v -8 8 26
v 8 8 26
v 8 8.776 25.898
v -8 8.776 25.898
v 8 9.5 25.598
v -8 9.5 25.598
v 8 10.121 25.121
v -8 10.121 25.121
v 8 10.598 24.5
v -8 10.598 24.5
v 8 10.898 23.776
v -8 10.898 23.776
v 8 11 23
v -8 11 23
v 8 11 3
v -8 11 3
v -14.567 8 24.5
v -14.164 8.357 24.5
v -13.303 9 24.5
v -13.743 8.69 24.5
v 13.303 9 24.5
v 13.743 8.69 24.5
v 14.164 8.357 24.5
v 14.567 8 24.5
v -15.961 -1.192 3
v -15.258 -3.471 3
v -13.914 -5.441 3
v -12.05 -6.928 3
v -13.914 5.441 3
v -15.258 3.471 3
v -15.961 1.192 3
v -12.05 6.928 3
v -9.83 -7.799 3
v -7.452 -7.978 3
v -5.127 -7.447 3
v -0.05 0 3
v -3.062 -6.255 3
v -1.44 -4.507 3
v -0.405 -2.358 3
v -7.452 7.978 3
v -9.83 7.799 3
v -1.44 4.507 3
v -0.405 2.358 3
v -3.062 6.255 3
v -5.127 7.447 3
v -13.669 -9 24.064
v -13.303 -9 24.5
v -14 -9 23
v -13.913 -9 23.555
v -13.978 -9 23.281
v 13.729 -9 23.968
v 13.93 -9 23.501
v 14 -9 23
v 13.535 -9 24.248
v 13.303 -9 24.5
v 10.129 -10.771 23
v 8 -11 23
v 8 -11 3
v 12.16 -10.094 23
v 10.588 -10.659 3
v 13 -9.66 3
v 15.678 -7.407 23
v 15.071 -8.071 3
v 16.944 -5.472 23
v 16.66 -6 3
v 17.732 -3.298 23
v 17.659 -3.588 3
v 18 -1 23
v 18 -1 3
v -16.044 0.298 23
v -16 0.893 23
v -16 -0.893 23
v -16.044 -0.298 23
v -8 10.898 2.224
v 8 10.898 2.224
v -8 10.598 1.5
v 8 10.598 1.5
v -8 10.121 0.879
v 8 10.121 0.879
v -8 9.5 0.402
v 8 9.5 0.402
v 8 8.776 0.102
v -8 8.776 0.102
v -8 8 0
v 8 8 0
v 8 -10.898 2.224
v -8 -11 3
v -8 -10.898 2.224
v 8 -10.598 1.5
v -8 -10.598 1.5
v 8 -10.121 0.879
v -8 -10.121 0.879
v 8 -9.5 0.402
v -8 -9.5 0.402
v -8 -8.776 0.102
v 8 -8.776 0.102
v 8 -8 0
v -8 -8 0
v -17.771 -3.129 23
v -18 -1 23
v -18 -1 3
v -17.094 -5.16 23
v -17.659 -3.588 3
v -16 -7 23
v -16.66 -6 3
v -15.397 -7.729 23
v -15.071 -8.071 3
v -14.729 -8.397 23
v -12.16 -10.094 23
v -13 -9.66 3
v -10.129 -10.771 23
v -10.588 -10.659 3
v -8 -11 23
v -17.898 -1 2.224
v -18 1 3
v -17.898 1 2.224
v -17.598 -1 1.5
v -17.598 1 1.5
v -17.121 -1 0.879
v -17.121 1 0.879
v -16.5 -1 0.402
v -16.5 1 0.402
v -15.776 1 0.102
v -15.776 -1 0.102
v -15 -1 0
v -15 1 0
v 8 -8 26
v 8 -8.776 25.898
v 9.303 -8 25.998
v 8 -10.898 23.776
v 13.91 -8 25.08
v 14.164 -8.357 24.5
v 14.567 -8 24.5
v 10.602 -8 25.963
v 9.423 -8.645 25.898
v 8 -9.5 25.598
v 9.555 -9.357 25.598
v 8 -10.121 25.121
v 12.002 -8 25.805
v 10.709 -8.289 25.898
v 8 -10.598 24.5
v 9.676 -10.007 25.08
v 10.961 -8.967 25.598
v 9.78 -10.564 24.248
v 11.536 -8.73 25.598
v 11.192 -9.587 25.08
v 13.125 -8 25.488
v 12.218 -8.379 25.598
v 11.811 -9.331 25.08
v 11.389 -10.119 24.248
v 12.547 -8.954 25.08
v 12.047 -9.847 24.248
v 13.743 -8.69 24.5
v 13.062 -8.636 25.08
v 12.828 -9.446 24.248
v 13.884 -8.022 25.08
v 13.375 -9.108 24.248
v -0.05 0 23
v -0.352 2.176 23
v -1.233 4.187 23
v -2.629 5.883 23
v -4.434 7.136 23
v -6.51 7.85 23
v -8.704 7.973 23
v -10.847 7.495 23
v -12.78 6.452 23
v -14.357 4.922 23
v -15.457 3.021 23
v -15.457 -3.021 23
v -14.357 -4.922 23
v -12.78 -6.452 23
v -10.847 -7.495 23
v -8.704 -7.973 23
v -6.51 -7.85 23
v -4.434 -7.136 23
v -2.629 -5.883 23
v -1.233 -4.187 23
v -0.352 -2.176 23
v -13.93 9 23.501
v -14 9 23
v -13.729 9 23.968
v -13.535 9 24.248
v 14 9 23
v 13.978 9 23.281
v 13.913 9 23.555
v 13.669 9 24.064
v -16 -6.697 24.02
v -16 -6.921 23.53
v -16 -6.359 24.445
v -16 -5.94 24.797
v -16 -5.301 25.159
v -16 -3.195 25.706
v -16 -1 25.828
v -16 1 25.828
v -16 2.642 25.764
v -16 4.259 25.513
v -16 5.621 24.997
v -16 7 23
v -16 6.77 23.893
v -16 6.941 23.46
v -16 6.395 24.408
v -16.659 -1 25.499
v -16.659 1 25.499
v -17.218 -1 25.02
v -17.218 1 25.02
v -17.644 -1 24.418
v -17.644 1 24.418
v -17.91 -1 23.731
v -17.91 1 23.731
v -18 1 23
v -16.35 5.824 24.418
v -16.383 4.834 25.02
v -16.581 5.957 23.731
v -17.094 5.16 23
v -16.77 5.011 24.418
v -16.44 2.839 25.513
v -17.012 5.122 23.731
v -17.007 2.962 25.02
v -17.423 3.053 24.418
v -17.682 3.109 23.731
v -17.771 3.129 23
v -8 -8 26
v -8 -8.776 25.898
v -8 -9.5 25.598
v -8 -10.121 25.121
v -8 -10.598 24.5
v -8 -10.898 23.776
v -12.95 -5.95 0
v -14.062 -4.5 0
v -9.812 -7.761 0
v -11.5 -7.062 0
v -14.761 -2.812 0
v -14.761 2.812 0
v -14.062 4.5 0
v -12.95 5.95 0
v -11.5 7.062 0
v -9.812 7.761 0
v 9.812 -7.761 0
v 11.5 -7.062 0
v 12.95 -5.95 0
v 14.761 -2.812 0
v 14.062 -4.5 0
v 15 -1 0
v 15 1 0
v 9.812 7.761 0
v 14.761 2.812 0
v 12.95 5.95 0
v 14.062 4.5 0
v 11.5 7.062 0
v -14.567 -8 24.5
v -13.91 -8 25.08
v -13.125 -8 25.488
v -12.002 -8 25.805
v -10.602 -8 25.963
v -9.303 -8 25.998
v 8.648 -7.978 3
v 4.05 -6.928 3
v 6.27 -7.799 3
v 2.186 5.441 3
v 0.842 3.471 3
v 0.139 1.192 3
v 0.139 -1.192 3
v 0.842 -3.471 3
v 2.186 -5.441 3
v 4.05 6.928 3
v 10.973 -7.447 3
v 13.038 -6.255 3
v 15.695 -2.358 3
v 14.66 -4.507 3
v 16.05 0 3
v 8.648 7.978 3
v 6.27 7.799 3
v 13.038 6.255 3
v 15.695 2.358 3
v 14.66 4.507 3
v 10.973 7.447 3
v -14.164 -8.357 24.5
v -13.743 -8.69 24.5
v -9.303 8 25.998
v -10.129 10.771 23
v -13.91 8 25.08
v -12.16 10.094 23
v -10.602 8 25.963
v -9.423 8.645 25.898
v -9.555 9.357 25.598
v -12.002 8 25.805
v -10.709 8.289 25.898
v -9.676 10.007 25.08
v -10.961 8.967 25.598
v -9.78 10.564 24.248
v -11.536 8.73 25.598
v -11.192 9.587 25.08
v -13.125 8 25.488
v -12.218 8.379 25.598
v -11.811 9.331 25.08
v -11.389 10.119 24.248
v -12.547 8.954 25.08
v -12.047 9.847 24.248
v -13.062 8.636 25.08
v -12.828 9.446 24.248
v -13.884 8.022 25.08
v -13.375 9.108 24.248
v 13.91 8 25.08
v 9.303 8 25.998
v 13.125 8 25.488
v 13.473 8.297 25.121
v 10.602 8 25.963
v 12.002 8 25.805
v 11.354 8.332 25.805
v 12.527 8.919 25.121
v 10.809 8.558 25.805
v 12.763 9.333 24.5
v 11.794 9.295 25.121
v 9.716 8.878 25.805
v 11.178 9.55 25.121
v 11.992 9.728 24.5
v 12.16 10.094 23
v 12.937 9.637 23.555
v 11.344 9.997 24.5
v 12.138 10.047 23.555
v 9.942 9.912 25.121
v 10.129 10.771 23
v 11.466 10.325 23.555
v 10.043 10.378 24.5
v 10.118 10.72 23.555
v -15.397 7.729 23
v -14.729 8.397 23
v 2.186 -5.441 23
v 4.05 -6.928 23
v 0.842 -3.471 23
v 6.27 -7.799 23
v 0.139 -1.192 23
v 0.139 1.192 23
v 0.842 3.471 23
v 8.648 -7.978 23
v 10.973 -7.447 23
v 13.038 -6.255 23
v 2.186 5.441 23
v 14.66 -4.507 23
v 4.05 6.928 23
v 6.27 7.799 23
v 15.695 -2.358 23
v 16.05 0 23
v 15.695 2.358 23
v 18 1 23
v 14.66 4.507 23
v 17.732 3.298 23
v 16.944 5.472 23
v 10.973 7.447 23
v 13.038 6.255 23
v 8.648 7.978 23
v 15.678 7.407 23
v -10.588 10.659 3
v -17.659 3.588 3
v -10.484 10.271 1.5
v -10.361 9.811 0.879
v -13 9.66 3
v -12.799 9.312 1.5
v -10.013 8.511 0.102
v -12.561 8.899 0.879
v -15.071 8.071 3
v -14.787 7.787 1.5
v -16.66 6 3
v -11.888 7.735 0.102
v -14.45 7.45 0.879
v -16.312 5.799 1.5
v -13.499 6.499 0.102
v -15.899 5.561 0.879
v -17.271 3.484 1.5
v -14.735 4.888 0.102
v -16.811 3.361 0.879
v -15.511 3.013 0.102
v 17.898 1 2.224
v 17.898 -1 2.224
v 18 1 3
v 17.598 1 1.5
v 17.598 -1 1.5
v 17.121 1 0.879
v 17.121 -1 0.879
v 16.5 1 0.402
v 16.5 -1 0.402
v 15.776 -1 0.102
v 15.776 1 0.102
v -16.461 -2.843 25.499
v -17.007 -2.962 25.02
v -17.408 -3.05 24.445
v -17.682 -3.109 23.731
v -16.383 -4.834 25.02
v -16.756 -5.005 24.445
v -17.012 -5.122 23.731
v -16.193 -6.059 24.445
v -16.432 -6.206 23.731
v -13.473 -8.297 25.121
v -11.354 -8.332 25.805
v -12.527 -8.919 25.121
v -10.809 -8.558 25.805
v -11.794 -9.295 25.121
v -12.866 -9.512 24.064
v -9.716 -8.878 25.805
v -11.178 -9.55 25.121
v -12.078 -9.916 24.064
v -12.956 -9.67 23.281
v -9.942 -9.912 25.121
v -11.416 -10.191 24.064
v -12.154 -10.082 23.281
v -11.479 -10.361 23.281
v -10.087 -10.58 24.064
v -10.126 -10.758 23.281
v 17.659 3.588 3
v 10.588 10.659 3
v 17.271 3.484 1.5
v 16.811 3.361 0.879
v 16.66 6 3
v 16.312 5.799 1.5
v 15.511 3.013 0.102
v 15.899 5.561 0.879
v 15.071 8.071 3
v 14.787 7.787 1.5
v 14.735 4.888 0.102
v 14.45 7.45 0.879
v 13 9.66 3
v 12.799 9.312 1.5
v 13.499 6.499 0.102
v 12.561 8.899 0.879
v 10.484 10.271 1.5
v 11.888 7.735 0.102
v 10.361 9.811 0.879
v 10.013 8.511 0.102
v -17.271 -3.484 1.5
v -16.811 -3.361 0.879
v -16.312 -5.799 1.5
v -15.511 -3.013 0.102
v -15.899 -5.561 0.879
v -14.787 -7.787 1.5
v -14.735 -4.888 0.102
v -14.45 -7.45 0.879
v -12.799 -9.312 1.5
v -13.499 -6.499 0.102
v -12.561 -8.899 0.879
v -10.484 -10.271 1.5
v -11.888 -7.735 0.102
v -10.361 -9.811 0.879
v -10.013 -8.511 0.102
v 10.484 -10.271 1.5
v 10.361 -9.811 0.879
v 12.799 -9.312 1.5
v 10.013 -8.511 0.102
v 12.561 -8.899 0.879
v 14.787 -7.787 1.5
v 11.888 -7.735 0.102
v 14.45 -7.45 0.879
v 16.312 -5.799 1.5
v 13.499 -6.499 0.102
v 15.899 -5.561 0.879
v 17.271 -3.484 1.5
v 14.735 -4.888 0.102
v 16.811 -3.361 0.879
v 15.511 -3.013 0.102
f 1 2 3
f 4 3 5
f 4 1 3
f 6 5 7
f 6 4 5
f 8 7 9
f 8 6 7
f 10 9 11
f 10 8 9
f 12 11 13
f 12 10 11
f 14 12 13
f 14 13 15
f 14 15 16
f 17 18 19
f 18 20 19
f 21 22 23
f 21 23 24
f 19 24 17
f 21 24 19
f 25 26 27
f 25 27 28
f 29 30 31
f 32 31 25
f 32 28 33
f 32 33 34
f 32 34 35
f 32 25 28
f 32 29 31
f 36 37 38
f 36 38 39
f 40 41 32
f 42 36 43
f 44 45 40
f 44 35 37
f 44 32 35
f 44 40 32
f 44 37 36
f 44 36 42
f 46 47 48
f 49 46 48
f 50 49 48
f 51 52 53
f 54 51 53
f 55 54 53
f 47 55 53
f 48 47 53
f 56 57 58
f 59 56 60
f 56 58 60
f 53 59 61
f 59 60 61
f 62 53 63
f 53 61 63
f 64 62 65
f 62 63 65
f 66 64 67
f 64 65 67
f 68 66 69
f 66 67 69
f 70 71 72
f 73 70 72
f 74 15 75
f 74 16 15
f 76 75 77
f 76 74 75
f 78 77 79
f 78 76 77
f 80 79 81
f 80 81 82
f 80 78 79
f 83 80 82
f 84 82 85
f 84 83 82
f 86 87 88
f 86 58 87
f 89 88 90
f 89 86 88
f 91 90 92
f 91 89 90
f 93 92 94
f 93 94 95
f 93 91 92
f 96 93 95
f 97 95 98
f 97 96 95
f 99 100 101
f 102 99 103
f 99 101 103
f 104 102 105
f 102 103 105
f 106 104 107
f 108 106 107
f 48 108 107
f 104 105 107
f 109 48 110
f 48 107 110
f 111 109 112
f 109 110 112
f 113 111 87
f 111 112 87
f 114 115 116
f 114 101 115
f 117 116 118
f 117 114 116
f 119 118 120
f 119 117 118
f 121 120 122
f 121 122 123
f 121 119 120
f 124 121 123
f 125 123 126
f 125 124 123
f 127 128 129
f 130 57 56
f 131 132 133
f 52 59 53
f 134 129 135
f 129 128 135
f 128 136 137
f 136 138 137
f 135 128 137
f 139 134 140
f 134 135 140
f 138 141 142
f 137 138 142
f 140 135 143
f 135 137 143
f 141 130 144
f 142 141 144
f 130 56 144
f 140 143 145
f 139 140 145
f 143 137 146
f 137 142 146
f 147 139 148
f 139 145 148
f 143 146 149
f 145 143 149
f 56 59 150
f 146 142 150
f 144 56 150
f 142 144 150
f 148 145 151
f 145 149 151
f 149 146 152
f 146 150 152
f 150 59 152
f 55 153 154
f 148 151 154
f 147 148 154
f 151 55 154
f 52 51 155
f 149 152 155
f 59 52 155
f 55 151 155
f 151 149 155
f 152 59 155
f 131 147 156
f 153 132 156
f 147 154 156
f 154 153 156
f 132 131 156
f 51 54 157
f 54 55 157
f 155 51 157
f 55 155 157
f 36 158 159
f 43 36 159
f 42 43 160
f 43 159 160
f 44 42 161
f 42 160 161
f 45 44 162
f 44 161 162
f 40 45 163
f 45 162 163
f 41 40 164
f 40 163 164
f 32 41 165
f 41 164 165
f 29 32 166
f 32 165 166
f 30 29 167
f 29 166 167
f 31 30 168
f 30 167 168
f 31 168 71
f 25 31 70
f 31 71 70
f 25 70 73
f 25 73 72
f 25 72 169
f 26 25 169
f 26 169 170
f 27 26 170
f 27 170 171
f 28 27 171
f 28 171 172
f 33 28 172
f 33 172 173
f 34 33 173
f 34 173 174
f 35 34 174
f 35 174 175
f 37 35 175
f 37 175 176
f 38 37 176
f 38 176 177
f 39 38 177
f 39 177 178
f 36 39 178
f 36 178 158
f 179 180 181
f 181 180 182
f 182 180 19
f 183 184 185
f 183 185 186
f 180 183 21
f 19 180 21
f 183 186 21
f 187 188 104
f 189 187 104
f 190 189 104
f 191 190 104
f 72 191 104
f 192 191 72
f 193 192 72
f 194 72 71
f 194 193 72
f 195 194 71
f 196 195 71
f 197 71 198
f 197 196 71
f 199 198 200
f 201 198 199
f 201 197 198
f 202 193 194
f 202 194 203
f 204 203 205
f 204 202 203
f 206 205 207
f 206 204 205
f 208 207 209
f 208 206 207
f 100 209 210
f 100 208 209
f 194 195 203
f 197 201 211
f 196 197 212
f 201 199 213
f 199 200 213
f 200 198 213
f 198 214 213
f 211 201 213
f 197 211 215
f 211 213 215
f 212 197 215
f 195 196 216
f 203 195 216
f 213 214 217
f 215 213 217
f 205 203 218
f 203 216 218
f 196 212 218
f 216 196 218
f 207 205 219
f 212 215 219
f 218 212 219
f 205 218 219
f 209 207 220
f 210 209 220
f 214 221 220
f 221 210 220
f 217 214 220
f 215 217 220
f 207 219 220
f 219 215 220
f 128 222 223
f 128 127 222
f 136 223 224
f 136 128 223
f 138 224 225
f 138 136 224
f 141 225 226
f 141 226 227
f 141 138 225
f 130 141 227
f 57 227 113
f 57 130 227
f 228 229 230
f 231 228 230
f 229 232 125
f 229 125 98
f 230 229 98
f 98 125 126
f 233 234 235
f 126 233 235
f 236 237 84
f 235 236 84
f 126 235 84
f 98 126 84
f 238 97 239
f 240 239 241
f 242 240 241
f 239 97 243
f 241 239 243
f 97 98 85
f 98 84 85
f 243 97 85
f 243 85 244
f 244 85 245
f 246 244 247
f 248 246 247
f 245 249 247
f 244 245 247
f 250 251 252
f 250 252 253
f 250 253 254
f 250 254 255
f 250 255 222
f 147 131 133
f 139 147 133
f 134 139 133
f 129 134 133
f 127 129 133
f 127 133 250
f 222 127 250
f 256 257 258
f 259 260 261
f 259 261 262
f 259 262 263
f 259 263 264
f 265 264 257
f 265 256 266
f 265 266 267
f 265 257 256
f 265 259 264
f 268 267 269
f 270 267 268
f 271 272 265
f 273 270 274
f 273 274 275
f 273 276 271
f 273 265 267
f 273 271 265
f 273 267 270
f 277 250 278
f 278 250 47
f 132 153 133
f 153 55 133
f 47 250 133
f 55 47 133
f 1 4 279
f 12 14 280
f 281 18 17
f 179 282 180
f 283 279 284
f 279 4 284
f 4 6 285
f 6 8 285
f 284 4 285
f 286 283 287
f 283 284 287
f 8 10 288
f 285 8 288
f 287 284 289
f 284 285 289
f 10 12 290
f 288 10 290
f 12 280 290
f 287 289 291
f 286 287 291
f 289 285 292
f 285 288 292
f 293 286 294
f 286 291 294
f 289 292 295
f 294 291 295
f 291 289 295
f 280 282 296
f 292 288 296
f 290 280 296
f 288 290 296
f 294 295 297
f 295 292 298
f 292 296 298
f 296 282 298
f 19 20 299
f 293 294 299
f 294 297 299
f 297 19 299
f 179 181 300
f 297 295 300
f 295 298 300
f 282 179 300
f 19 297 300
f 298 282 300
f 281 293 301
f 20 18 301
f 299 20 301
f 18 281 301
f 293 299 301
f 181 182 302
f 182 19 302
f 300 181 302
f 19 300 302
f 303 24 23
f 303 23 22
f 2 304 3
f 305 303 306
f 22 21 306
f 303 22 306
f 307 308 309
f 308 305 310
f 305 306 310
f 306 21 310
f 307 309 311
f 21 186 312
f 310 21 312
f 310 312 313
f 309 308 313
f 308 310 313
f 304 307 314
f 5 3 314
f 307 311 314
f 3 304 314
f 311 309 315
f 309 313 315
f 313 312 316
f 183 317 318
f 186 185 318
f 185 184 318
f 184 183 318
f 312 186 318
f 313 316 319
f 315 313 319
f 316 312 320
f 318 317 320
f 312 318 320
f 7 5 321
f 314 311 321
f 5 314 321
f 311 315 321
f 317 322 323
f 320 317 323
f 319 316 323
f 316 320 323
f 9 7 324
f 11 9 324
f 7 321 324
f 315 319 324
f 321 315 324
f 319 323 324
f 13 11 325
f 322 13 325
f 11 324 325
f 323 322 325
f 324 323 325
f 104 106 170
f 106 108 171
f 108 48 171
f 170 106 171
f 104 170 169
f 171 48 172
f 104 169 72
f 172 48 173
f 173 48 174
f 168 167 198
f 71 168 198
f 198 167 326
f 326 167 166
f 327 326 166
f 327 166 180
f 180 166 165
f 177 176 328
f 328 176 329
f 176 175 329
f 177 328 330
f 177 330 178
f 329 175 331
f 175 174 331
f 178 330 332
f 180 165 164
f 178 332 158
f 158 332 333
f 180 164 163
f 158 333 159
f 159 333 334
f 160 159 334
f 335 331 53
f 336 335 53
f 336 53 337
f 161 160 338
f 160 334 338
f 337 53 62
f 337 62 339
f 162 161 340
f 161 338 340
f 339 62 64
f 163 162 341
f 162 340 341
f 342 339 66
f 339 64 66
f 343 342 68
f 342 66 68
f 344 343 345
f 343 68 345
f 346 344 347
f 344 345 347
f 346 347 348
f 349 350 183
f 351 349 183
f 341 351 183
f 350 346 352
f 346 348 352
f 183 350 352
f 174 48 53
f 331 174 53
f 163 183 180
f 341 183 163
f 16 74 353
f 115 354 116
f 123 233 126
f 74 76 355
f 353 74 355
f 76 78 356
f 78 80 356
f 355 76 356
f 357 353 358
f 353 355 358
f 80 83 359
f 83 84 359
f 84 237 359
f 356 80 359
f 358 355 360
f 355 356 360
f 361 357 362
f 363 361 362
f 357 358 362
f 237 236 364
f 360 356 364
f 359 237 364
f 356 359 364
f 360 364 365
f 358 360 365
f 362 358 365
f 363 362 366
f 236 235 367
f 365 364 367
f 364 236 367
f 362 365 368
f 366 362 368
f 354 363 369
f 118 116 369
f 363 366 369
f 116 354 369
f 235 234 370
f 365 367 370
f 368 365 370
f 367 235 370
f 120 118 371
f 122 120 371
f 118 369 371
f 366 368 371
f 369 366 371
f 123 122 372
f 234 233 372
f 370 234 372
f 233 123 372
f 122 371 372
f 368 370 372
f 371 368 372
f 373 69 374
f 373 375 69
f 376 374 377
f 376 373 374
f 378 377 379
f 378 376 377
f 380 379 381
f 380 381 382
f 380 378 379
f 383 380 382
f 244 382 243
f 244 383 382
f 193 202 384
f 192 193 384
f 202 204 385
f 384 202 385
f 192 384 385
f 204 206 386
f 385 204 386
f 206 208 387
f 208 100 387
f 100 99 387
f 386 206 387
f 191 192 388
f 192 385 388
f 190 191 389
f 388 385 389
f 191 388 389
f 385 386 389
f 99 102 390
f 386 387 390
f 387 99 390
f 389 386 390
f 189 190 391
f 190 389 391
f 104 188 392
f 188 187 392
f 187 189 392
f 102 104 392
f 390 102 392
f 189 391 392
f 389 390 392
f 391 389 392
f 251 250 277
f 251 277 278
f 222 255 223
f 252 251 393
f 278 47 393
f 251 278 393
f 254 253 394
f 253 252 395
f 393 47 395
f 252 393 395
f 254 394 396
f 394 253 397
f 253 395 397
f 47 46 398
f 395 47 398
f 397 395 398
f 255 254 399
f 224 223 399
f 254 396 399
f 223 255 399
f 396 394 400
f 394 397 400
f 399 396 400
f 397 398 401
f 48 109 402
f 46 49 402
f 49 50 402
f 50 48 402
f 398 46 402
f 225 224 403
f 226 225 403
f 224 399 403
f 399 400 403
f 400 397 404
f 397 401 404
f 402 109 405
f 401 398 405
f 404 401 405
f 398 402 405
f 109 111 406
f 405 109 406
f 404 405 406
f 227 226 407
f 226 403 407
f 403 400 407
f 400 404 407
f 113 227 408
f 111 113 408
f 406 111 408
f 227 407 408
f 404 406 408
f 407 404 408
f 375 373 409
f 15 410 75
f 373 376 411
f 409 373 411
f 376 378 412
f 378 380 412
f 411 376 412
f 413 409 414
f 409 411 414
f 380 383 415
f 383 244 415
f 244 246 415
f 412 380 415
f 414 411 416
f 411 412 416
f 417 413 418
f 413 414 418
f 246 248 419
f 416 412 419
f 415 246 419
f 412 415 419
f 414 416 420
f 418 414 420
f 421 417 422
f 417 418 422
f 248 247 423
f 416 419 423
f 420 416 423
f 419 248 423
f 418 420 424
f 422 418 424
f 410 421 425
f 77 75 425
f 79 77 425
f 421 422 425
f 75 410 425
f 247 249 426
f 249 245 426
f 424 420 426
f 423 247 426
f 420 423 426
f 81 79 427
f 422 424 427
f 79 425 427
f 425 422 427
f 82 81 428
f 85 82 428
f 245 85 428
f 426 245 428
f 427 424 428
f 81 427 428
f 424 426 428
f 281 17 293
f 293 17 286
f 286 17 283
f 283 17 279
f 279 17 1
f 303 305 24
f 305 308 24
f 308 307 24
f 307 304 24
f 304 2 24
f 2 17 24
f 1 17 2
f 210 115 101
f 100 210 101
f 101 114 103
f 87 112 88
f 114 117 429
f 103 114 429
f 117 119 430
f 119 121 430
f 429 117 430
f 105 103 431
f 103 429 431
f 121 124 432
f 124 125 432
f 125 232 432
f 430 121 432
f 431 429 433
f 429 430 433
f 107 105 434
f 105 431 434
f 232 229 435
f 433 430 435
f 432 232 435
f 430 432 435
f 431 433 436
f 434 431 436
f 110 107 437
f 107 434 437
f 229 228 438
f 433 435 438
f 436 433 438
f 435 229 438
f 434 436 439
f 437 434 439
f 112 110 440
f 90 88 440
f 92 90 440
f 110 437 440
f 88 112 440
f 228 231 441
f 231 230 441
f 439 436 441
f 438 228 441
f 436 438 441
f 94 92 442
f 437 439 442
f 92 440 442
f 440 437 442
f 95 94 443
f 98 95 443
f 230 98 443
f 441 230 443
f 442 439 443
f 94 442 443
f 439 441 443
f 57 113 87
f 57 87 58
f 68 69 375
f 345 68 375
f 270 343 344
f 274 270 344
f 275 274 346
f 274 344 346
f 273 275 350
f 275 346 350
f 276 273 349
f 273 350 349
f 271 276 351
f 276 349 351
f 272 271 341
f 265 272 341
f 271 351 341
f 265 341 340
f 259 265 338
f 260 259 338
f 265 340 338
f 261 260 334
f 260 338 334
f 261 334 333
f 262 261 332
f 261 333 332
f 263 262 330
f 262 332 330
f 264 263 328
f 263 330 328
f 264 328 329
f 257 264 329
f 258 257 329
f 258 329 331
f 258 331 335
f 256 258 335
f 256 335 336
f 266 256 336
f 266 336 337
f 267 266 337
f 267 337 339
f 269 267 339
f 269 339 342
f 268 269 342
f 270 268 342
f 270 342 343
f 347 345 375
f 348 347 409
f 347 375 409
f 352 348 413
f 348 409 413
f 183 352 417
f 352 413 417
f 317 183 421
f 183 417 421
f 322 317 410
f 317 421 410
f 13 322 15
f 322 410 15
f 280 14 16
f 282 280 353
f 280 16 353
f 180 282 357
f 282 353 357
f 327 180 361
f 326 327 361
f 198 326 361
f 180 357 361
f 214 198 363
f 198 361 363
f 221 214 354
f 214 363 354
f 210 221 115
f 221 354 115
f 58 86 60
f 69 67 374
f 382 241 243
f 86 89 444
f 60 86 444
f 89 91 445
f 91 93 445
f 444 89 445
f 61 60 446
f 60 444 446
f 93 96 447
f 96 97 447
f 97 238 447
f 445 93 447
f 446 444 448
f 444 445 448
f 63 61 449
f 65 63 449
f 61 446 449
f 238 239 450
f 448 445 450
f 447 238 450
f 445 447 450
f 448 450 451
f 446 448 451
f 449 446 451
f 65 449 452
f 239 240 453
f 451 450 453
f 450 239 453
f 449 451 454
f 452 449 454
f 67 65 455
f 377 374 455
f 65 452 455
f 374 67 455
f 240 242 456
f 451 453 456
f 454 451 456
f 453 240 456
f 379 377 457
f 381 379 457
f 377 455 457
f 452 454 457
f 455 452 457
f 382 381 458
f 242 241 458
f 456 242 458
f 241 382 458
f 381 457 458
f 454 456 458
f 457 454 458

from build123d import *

# Parameters (mm, degrees)
F1_DEPTH  = 26
F2_R      = 3
F3_R      = 8
F4_DEPTH  = 23
F6_R      = 8
F7_DEPTH  = 3
F8_R      = 3
F11_DEPTH = 35


with BuildPart() as f1:
    # F0 (on Top) → F1 (new body)
    with BuildSketch(Plane.XY):
        with BuildLine():
            Line((-8, -11), (8, -11))
            ThreePointArc((8, -11), (15.0710678119, -8.0710678119), (18, -1))
            Line((18, -1), (18, 1))
            ThreePointArc((18, 1), (15.0710678119, 8.0710678119), (8, 11))
            Line((8, 11), (-8, 11))
            ThreePointArc((-8, 11), (-15.0710678119, 8.0710678119), (-18, 1))
            Line((-18, 1), (-18, -1))
            ThreePointArc((-18, -1), (-15.0710678119, -8.0710678119), (-8, -11))
        make_face()
    extrude(amount=F1_DEPTH)

    # F2
    f2_edges = [f1.edges().sort_by_distance(p)[0] for p in [
        (0, -11, 0),
        (15.071068, -8.071068, 0),
        (18, 0, 0),
        (15.071068, 8.071068, 0),
        (0, 11, 0),
        (-15.071068, 8.071068, 0),
        (-18, 0, 0),
        (-15.071068, -8.071068, 0),
    ]]
    fillet(f2_edges, radius=F2_R)

    # F3 (on face) → F4 (cut)
    with BuildSketch(Plane.XY.offset(26)):
        with Locations((8.05, 0)):
            Circle(F3_R)
        with Locations((-8.05, 0)):
            Circle(F3_R)
    extrude(amount=-F4_DEPTH, mode=Mode.SUBTRACT)

    # F6 (on offset) → F7 (join, through all)
    with BuildSketch(Plane.XY.offset(23)):
        with Locations((-8.05, 0)):
            Circle(F6_R)
        with Locations((8.05, 0)):
            Circle(F6_R)
    extrude(amount=F7_DEPTH)

    # F8
    f8_edges = [f1.edges().sort_by_distance(p)[0] for p in [
        (0, -11, 26),
        (15.071068, -8.071068, 26),
        (18, 0, 26),
        (15.071068, 8.071068, 26),
        (0, 11, 26),
        (-15.071068, 8.071068, 26),
        (-18, 0, 26),
        (-15.071068, -8.071068, 26),
    ]]
    fillet(f8_edges, radius=F8_R)

    # F10 (on offset) → F11 (cut)
    with BuildSketch(Plane.YZ.offset(19)):
        Polygon((-1, 26), (-8, 26), (-8, 24.5), (-9, 24.5), (-9, 23), (-8, 23), (8, 23), (9, 23), (9, 24.5), (8, 24.5), (8, 26), (1, 26), align=None)
    extrude(amount=-F11_DEPTH, mode=Mode.SUBTRACT)


solid = f1.part
